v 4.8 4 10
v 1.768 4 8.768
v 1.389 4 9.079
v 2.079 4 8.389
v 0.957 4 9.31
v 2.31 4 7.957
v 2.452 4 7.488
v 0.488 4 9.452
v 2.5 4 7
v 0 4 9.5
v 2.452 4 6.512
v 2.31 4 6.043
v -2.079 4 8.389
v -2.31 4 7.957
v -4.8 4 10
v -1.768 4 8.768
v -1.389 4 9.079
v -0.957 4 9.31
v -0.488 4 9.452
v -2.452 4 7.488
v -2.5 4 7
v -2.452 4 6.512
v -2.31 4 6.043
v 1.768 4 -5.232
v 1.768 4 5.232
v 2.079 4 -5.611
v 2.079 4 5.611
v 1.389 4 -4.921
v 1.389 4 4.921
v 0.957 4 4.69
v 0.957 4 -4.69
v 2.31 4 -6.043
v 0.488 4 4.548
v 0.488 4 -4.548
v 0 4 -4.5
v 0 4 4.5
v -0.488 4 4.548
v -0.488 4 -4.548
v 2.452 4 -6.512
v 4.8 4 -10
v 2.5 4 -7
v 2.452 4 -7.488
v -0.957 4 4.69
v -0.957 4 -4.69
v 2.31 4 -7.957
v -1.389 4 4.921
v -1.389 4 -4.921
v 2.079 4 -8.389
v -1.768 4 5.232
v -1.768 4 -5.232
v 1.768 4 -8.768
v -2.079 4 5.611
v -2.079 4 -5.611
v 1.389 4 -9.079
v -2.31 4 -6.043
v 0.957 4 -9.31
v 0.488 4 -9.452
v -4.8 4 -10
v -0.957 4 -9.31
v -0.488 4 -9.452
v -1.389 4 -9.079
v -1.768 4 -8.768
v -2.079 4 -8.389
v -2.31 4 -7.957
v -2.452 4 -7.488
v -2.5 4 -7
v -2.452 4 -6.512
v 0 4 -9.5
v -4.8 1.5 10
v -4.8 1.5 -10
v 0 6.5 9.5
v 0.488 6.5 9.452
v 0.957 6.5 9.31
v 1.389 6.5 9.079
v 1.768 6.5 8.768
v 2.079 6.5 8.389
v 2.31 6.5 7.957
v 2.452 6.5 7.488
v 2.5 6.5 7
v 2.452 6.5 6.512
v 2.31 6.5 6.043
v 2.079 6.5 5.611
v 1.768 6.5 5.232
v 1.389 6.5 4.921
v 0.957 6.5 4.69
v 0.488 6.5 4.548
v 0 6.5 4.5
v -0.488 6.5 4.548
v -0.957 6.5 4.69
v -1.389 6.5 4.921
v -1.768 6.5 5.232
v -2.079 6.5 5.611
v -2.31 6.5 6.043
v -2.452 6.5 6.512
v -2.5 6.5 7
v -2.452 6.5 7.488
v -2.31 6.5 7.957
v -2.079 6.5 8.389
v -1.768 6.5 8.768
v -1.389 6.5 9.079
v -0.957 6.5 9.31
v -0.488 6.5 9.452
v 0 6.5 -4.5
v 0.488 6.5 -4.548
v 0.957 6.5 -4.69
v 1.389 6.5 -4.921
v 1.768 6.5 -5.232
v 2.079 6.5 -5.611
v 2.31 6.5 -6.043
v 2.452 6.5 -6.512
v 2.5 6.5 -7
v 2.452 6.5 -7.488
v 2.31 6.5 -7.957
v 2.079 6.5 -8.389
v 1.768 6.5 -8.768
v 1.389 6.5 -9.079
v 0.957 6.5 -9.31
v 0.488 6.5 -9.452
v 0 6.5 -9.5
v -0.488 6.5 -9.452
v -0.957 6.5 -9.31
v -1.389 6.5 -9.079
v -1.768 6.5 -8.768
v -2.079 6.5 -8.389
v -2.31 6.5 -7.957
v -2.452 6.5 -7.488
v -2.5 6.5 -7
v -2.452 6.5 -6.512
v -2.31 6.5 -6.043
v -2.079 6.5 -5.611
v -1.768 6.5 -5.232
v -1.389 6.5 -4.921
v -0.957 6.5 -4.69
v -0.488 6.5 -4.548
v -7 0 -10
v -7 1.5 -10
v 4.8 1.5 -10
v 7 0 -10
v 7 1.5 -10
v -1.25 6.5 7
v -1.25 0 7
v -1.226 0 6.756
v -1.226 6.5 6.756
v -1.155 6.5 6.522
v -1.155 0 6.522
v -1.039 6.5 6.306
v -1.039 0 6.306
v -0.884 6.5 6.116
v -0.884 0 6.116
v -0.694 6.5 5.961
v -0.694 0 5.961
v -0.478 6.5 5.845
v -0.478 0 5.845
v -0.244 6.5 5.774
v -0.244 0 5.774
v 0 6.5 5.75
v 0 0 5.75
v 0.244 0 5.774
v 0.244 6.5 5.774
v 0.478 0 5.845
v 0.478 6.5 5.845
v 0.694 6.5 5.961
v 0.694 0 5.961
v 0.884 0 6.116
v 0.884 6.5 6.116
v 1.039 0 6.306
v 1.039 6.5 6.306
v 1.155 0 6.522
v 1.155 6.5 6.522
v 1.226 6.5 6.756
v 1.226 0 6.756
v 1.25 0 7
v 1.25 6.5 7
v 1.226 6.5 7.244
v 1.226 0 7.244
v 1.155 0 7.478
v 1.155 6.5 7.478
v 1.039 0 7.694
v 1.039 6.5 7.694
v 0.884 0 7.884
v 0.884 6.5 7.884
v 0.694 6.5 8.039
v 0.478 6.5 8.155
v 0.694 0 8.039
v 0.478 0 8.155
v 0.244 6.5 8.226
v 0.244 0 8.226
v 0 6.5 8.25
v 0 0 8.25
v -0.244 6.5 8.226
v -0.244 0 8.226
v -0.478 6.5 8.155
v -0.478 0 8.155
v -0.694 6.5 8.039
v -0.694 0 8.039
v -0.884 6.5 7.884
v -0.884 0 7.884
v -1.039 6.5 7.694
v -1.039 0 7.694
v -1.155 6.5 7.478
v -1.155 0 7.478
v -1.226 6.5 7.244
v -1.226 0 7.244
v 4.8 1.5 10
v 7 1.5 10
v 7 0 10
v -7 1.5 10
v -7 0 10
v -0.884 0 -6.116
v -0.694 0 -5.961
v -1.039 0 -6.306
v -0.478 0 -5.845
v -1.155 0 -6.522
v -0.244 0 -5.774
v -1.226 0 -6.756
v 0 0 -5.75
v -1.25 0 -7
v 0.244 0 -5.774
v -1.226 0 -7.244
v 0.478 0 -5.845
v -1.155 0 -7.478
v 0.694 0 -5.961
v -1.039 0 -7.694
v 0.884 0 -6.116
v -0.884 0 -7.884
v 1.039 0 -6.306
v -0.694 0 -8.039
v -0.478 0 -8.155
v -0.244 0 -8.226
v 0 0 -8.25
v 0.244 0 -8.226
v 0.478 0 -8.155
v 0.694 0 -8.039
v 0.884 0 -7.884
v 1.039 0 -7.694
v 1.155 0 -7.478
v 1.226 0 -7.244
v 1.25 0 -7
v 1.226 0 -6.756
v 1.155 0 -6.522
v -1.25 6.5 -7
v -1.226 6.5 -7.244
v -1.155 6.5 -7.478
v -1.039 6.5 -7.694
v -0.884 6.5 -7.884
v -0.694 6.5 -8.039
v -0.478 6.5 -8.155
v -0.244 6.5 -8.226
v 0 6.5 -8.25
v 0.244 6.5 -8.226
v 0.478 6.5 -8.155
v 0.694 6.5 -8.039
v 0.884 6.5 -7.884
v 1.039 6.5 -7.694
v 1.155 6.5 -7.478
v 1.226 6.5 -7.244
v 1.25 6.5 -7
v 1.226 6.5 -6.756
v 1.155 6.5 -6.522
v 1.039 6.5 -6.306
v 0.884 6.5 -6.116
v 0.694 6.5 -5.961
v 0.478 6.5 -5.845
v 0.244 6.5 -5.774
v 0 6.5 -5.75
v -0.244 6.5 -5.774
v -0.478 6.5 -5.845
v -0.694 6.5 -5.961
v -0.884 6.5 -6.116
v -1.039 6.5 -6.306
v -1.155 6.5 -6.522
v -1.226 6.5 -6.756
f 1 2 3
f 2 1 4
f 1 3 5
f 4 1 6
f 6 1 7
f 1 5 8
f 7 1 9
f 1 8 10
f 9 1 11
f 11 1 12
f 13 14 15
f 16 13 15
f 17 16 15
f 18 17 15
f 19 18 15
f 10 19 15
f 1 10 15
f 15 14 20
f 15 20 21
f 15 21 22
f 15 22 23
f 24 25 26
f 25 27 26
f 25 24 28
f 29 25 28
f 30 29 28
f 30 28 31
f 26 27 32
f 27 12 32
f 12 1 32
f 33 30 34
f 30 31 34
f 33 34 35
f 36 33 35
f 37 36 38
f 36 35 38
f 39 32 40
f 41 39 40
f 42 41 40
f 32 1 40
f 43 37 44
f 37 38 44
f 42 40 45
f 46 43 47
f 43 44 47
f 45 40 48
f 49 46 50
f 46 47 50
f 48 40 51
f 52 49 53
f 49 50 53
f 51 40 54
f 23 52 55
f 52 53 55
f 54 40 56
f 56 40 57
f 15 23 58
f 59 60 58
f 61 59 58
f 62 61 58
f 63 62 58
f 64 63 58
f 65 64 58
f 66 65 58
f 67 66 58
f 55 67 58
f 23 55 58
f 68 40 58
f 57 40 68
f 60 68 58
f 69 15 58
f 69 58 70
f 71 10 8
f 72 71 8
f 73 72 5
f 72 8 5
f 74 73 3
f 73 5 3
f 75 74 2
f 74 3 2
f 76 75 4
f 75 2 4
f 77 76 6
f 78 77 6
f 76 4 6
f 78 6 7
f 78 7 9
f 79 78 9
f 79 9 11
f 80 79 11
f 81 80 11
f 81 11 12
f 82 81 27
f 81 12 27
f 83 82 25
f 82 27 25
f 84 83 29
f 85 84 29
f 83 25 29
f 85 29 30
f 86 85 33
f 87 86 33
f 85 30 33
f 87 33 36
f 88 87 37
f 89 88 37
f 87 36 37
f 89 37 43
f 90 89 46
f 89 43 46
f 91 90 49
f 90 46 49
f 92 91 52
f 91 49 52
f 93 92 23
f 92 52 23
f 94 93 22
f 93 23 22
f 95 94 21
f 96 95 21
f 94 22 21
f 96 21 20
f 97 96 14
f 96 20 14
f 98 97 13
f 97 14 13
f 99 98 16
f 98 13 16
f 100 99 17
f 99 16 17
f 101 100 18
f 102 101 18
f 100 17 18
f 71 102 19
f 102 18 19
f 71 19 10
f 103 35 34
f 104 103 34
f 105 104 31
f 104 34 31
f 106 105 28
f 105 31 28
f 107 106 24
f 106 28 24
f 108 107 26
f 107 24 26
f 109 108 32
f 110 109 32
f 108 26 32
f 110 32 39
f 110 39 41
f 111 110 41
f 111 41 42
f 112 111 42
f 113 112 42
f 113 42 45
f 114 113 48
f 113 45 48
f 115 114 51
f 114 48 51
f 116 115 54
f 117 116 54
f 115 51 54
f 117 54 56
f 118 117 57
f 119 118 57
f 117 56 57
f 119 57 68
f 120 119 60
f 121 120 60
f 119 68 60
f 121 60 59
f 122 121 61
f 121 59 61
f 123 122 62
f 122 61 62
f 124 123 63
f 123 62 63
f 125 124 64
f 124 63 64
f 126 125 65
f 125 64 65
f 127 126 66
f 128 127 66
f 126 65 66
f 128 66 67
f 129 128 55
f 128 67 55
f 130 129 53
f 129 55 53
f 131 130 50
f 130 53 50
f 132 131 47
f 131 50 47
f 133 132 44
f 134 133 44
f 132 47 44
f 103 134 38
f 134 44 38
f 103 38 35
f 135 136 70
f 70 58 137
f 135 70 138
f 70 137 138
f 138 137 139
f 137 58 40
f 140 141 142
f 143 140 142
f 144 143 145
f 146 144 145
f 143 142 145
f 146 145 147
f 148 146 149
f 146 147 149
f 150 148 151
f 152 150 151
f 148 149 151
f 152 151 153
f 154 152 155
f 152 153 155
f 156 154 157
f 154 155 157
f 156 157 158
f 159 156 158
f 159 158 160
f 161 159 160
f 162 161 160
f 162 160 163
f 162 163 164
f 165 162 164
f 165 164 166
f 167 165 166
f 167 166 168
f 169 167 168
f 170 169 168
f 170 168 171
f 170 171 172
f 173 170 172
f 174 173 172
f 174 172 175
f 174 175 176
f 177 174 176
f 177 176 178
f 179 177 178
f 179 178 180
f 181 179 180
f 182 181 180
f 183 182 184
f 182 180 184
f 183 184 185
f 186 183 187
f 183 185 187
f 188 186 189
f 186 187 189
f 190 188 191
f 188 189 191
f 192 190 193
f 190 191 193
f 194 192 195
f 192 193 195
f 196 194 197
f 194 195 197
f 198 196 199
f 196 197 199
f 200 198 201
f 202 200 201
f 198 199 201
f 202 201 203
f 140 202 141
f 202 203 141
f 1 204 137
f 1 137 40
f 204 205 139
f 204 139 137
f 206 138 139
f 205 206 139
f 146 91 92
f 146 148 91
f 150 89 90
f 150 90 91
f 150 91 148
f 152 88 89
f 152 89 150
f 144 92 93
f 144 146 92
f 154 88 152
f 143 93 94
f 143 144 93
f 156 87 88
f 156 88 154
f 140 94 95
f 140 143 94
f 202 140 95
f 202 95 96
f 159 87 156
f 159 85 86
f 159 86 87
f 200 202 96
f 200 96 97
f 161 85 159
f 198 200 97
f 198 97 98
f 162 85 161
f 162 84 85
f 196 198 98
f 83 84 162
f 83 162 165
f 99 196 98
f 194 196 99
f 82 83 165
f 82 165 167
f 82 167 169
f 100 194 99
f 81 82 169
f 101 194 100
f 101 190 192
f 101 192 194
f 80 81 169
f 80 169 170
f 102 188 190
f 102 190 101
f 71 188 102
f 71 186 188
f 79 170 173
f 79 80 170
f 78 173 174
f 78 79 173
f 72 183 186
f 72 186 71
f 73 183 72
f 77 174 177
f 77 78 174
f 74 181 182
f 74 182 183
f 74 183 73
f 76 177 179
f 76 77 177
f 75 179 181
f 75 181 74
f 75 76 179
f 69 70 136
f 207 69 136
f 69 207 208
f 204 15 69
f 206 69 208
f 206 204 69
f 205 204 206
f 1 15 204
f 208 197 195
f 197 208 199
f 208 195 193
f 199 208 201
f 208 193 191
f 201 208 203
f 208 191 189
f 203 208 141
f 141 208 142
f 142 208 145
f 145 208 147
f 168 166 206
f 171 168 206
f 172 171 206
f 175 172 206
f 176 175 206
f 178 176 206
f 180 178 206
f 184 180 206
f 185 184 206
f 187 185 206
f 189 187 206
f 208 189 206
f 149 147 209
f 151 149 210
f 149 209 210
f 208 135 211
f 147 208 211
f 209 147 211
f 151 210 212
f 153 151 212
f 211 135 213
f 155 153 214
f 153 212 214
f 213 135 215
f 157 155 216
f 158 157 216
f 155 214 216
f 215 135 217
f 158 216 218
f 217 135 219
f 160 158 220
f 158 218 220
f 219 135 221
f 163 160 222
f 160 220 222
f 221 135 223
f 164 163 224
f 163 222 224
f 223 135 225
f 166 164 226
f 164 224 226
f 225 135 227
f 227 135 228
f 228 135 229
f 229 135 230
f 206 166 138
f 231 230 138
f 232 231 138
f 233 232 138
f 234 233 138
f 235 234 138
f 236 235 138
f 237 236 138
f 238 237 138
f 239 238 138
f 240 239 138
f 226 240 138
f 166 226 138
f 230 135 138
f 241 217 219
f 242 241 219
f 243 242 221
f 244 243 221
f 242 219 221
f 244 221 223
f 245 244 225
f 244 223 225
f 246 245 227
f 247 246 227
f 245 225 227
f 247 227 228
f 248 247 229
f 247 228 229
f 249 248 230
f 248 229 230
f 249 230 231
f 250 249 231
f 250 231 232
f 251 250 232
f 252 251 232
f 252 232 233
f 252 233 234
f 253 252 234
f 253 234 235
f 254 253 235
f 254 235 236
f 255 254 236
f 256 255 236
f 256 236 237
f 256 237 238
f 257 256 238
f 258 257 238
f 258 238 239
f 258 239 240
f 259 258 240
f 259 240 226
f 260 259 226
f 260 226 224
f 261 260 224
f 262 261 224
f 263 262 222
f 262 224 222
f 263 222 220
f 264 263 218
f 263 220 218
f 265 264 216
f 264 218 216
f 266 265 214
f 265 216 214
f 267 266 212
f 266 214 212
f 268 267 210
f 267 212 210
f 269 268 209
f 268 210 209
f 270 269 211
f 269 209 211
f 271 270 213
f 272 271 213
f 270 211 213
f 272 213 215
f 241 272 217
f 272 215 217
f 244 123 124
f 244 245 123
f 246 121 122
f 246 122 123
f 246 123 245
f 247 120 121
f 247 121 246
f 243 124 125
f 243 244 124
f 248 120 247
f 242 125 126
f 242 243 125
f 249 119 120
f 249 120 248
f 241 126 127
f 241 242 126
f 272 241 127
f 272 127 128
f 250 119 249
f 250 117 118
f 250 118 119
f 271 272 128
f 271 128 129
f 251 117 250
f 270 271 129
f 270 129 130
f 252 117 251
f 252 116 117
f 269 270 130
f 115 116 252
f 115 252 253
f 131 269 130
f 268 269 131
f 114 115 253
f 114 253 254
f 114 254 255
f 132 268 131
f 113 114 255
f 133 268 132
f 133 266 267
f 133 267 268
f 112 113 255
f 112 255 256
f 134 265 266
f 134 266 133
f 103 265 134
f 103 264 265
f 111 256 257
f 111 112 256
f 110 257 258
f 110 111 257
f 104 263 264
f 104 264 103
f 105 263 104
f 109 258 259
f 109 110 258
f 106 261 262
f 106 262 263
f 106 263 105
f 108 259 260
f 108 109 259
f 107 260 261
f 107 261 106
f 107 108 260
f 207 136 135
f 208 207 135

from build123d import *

# Parameters (mm, degrees)
AUFSATZ_LINEAR_AUSTRAGEN1_DEPTH      = 10
AUFSATZ_LINEAR_AUSTRAGEN1_DEPTH_BACK = 10
SKIZZE2_R                            = 2.5
AUFSATZ_LINEAR_AUSTRAGEN2_DEPTH      = 2.5
M3_GEWINDEBOHRUNG1_D                 = 2.5


with BuildPart() as part:
    # Skizze1 → Aufsatz-Linear austragen1 (new, two sides: drawn at the far end of the back side and taken through both)
    with BuildSketch(Plane.XY.offset(-AUFSATZ_LINEAR_AUSTRAGEN1_DEPTH_BACK)):
        Polygon((-7, 0), (7, 0), (7, 1.5), (4.8, 1.5), (4.8, 4), (-4.8, 4), (-4.8, 1.5), (-7, 1.5), align=None)
    extrude(amount=AUFSATZ_LINEAR_AUSTRAGEN1_DEPTH + AUFSATZ_LINEAR_AUSTRAGEN1_DEPTH_BACK)

    # Skizze2 → Aufsatz-Linear austragen2 (add)
    with BuildSketch(Plane(origin=(0, 4, 0), x_dir=(1, 0, 0), z_dir=(0, 1, 0))):
        with Locations((0, 7)):
            Circle(SKIZZE2_R)
        with Locations((0, -7)):
            Circle(SKIZZE2_R)
    extrude(amount=AUFSATZ_LINEAR_AUSTRAGEN2_DEPTH)

    # M3 Gewindebohrung1 (through all)
    with Locations(Plane(origin=(0, 6.5, 0), x_dir=(1, 0, 0), z_dir=(0, 1, 0))):
        with Locations((0, -7), (0, 7)):
            Hole(M3_GEWINDEBOHRUNG1_D / 2)


solid = part.part
